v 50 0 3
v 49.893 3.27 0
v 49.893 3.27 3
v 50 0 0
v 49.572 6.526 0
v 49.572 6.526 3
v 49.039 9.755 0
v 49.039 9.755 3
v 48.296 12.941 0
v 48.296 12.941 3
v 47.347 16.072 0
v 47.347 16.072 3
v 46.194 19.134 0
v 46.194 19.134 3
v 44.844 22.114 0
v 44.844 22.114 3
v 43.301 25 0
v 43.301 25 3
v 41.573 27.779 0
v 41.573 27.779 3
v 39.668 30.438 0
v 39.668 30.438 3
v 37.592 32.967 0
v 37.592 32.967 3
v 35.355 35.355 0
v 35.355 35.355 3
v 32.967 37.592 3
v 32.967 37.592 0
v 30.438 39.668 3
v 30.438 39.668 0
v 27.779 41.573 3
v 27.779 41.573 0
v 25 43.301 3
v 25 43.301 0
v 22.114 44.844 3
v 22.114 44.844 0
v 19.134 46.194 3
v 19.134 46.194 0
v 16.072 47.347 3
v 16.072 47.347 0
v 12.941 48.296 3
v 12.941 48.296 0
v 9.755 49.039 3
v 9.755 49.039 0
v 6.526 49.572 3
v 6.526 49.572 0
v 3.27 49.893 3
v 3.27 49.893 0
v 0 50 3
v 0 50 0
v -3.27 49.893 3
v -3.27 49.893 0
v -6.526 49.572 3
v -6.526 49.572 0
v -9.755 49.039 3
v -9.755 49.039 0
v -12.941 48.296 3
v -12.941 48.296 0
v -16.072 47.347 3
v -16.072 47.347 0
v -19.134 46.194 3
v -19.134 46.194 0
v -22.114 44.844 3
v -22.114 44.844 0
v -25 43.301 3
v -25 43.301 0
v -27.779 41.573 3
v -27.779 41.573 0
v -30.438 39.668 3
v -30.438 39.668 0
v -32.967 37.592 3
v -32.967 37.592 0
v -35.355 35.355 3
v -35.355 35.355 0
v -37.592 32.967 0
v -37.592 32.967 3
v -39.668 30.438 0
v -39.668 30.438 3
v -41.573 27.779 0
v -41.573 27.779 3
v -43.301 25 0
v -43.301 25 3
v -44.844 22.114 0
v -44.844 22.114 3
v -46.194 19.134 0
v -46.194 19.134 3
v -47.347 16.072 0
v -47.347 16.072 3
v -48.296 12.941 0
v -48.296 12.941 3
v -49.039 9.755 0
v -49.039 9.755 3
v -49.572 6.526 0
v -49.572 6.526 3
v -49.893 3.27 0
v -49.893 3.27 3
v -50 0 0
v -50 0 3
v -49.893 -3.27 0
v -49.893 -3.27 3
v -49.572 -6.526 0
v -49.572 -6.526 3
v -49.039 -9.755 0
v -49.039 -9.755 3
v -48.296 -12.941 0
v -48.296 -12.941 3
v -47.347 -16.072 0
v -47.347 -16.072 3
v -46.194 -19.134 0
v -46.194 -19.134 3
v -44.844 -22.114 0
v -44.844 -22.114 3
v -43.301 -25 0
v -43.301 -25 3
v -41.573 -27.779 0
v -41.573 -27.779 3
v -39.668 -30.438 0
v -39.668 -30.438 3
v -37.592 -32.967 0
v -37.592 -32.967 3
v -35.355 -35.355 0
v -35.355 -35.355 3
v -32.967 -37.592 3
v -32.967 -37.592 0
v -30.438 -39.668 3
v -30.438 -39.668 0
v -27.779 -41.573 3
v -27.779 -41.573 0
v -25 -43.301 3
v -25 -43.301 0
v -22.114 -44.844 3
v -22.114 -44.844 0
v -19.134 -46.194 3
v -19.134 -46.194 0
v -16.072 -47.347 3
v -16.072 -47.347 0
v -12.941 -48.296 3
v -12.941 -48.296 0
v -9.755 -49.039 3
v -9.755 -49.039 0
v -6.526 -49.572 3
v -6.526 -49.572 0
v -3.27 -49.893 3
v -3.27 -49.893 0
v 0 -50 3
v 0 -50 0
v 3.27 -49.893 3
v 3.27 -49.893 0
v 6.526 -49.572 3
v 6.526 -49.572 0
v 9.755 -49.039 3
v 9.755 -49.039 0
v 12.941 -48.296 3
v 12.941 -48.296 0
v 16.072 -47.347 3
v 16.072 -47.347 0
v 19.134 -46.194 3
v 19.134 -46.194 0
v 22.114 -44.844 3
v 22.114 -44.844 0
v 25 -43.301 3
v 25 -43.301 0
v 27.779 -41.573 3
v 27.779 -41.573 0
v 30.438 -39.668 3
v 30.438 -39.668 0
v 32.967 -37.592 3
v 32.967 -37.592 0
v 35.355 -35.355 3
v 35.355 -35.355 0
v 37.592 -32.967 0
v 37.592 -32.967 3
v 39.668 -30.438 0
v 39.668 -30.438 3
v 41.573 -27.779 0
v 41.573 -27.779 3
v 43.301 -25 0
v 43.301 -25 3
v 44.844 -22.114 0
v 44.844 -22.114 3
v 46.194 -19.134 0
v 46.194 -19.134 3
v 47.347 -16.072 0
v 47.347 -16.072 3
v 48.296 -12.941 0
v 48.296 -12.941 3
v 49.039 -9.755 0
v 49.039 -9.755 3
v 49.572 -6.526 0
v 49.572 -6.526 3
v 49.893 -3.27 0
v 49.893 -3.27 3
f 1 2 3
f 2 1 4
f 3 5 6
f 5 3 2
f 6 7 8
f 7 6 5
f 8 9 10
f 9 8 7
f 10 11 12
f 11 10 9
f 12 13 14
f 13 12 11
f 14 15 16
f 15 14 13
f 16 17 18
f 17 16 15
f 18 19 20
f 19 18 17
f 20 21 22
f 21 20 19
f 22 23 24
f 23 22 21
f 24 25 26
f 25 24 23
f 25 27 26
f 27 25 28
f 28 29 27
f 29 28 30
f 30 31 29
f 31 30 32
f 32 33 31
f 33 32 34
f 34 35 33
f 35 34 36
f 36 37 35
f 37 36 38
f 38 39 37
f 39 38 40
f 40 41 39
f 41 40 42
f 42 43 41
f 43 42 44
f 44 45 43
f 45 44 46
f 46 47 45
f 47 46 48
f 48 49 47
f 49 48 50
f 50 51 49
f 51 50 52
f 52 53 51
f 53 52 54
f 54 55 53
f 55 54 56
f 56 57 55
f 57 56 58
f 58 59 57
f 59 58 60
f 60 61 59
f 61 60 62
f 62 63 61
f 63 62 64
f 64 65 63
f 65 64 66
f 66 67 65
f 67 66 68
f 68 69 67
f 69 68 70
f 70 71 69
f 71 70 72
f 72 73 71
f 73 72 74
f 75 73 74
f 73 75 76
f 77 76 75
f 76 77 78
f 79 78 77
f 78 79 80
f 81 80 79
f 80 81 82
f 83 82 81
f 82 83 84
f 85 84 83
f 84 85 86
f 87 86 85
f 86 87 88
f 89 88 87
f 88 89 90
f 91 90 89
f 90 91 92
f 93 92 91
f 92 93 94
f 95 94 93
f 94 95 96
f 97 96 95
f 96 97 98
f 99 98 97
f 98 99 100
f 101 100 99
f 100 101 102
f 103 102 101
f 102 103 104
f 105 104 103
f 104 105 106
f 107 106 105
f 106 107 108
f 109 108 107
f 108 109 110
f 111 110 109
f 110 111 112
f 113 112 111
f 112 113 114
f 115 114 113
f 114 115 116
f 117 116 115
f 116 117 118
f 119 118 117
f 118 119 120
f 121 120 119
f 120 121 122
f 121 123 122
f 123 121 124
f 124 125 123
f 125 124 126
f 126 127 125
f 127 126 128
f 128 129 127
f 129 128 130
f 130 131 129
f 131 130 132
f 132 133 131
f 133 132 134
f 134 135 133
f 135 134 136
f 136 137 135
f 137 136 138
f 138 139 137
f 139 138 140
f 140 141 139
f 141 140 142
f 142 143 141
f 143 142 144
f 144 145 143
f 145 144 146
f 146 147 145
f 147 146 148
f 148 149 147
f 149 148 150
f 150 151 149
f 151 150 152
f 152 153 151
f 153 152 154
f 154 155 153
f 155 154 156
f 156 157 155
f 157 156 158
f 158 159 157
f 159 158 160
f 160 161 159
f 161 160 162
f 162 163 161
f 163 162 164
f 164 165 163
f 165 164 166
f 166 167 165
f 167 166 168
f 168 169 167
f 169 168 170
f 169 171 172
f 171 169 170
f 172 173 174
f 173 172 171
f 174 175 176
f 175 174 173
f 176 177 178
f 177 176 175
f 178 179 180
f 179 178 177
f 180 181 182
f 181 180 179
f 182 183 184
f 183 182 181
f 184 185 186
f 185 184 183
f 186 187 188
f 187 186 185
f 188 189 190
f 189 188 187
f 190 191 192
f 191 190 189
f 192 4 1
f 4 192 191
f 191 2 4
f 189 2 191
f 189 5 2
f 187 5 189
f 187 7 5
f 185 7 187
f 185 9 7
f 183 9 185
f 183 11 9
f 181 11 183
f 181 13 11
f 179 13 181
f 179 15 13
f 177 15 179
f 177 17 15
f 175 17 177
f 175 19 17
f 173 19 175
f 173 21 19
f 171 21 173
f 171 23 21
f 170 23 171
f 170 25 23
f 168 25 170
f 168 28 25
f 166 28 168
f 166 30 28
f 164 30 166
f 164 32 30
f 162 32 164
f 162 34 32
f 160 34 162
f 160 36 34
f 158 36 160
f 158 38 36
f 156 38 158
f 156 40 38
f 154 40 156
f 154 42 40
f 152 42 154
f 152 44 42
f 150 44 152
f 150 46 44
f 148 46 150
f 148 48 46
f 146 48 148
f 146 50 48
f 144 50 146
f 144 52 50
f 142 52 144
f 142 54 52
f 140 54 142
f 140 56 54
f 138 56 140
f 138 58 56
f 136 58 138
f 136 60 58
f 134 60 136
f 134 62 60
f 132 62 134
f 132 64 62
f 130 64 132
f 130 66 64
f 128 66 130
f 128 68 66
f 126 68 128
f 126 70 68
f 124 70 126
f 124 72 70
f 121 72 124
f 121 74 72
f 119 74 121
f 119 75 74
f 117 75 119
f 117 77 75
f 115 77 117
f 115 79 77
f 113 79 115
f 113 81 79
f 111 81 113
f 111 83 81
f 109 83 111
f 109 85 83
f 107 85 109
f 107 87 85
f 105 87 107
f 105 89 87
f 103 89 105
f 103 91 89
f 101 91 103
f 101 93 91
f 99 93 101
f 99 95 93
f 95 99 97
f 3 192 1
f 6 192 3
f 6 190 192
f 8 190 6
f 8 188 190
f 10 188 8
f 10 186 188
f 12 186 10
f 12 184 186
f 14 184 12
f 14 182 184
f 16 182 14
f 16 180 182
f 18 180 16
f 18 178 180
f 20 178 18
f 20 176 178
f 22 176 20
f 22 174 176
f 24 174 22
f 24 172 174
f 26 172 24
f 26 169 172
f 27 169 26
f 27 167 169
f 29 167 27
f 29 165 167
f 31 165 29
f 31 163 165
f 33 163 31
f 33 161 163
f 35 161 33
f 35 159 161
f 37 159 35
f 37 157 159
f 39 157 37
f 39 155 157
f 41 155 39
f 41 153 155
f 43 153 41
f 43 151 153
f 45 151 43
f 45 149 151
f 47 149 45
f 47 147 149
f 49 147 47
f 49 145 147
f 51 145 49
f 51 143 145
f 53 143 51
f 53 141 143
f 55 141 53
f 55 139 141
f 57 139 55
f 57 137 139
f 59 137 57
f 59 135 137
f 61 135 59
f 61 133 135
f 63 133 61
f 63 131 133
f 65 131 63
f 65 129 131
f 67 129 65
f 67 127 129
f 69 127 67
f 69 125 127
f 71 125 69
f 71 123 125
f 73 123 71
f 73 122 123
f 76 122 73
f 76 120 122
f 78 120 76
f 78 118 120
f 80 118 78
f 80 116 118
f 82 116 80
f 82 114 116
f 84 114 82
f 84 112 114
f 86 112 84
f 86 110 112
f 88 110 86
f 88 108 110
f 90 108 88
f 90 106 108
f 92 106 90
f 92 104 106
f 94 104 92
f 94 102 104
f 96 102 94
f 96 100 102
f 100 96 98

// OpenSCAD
// Logo Mesa3D em relevo (para foto de perfil e também imprimível como placa/ímã).
// PARTE: base | icone | texto
PARTE = "base";
use <../kit/kit_rpg.scad>
$fn = 96;
D = 100;
if (PARTE == "base") cylinder(d = D, h = 3);
if (PARTE == "icone") translate([0, 11, 2.99]) linear_extrude(1.4) d20_2d(27, 2.6);
if (PARTE == "texto") translate([0, -27, 2.99]) linear_extrude(1.4) text("MESA3D", size = 12.5, halign = "center", valign = "center", font = "Liberation Sans:style=Bold");
